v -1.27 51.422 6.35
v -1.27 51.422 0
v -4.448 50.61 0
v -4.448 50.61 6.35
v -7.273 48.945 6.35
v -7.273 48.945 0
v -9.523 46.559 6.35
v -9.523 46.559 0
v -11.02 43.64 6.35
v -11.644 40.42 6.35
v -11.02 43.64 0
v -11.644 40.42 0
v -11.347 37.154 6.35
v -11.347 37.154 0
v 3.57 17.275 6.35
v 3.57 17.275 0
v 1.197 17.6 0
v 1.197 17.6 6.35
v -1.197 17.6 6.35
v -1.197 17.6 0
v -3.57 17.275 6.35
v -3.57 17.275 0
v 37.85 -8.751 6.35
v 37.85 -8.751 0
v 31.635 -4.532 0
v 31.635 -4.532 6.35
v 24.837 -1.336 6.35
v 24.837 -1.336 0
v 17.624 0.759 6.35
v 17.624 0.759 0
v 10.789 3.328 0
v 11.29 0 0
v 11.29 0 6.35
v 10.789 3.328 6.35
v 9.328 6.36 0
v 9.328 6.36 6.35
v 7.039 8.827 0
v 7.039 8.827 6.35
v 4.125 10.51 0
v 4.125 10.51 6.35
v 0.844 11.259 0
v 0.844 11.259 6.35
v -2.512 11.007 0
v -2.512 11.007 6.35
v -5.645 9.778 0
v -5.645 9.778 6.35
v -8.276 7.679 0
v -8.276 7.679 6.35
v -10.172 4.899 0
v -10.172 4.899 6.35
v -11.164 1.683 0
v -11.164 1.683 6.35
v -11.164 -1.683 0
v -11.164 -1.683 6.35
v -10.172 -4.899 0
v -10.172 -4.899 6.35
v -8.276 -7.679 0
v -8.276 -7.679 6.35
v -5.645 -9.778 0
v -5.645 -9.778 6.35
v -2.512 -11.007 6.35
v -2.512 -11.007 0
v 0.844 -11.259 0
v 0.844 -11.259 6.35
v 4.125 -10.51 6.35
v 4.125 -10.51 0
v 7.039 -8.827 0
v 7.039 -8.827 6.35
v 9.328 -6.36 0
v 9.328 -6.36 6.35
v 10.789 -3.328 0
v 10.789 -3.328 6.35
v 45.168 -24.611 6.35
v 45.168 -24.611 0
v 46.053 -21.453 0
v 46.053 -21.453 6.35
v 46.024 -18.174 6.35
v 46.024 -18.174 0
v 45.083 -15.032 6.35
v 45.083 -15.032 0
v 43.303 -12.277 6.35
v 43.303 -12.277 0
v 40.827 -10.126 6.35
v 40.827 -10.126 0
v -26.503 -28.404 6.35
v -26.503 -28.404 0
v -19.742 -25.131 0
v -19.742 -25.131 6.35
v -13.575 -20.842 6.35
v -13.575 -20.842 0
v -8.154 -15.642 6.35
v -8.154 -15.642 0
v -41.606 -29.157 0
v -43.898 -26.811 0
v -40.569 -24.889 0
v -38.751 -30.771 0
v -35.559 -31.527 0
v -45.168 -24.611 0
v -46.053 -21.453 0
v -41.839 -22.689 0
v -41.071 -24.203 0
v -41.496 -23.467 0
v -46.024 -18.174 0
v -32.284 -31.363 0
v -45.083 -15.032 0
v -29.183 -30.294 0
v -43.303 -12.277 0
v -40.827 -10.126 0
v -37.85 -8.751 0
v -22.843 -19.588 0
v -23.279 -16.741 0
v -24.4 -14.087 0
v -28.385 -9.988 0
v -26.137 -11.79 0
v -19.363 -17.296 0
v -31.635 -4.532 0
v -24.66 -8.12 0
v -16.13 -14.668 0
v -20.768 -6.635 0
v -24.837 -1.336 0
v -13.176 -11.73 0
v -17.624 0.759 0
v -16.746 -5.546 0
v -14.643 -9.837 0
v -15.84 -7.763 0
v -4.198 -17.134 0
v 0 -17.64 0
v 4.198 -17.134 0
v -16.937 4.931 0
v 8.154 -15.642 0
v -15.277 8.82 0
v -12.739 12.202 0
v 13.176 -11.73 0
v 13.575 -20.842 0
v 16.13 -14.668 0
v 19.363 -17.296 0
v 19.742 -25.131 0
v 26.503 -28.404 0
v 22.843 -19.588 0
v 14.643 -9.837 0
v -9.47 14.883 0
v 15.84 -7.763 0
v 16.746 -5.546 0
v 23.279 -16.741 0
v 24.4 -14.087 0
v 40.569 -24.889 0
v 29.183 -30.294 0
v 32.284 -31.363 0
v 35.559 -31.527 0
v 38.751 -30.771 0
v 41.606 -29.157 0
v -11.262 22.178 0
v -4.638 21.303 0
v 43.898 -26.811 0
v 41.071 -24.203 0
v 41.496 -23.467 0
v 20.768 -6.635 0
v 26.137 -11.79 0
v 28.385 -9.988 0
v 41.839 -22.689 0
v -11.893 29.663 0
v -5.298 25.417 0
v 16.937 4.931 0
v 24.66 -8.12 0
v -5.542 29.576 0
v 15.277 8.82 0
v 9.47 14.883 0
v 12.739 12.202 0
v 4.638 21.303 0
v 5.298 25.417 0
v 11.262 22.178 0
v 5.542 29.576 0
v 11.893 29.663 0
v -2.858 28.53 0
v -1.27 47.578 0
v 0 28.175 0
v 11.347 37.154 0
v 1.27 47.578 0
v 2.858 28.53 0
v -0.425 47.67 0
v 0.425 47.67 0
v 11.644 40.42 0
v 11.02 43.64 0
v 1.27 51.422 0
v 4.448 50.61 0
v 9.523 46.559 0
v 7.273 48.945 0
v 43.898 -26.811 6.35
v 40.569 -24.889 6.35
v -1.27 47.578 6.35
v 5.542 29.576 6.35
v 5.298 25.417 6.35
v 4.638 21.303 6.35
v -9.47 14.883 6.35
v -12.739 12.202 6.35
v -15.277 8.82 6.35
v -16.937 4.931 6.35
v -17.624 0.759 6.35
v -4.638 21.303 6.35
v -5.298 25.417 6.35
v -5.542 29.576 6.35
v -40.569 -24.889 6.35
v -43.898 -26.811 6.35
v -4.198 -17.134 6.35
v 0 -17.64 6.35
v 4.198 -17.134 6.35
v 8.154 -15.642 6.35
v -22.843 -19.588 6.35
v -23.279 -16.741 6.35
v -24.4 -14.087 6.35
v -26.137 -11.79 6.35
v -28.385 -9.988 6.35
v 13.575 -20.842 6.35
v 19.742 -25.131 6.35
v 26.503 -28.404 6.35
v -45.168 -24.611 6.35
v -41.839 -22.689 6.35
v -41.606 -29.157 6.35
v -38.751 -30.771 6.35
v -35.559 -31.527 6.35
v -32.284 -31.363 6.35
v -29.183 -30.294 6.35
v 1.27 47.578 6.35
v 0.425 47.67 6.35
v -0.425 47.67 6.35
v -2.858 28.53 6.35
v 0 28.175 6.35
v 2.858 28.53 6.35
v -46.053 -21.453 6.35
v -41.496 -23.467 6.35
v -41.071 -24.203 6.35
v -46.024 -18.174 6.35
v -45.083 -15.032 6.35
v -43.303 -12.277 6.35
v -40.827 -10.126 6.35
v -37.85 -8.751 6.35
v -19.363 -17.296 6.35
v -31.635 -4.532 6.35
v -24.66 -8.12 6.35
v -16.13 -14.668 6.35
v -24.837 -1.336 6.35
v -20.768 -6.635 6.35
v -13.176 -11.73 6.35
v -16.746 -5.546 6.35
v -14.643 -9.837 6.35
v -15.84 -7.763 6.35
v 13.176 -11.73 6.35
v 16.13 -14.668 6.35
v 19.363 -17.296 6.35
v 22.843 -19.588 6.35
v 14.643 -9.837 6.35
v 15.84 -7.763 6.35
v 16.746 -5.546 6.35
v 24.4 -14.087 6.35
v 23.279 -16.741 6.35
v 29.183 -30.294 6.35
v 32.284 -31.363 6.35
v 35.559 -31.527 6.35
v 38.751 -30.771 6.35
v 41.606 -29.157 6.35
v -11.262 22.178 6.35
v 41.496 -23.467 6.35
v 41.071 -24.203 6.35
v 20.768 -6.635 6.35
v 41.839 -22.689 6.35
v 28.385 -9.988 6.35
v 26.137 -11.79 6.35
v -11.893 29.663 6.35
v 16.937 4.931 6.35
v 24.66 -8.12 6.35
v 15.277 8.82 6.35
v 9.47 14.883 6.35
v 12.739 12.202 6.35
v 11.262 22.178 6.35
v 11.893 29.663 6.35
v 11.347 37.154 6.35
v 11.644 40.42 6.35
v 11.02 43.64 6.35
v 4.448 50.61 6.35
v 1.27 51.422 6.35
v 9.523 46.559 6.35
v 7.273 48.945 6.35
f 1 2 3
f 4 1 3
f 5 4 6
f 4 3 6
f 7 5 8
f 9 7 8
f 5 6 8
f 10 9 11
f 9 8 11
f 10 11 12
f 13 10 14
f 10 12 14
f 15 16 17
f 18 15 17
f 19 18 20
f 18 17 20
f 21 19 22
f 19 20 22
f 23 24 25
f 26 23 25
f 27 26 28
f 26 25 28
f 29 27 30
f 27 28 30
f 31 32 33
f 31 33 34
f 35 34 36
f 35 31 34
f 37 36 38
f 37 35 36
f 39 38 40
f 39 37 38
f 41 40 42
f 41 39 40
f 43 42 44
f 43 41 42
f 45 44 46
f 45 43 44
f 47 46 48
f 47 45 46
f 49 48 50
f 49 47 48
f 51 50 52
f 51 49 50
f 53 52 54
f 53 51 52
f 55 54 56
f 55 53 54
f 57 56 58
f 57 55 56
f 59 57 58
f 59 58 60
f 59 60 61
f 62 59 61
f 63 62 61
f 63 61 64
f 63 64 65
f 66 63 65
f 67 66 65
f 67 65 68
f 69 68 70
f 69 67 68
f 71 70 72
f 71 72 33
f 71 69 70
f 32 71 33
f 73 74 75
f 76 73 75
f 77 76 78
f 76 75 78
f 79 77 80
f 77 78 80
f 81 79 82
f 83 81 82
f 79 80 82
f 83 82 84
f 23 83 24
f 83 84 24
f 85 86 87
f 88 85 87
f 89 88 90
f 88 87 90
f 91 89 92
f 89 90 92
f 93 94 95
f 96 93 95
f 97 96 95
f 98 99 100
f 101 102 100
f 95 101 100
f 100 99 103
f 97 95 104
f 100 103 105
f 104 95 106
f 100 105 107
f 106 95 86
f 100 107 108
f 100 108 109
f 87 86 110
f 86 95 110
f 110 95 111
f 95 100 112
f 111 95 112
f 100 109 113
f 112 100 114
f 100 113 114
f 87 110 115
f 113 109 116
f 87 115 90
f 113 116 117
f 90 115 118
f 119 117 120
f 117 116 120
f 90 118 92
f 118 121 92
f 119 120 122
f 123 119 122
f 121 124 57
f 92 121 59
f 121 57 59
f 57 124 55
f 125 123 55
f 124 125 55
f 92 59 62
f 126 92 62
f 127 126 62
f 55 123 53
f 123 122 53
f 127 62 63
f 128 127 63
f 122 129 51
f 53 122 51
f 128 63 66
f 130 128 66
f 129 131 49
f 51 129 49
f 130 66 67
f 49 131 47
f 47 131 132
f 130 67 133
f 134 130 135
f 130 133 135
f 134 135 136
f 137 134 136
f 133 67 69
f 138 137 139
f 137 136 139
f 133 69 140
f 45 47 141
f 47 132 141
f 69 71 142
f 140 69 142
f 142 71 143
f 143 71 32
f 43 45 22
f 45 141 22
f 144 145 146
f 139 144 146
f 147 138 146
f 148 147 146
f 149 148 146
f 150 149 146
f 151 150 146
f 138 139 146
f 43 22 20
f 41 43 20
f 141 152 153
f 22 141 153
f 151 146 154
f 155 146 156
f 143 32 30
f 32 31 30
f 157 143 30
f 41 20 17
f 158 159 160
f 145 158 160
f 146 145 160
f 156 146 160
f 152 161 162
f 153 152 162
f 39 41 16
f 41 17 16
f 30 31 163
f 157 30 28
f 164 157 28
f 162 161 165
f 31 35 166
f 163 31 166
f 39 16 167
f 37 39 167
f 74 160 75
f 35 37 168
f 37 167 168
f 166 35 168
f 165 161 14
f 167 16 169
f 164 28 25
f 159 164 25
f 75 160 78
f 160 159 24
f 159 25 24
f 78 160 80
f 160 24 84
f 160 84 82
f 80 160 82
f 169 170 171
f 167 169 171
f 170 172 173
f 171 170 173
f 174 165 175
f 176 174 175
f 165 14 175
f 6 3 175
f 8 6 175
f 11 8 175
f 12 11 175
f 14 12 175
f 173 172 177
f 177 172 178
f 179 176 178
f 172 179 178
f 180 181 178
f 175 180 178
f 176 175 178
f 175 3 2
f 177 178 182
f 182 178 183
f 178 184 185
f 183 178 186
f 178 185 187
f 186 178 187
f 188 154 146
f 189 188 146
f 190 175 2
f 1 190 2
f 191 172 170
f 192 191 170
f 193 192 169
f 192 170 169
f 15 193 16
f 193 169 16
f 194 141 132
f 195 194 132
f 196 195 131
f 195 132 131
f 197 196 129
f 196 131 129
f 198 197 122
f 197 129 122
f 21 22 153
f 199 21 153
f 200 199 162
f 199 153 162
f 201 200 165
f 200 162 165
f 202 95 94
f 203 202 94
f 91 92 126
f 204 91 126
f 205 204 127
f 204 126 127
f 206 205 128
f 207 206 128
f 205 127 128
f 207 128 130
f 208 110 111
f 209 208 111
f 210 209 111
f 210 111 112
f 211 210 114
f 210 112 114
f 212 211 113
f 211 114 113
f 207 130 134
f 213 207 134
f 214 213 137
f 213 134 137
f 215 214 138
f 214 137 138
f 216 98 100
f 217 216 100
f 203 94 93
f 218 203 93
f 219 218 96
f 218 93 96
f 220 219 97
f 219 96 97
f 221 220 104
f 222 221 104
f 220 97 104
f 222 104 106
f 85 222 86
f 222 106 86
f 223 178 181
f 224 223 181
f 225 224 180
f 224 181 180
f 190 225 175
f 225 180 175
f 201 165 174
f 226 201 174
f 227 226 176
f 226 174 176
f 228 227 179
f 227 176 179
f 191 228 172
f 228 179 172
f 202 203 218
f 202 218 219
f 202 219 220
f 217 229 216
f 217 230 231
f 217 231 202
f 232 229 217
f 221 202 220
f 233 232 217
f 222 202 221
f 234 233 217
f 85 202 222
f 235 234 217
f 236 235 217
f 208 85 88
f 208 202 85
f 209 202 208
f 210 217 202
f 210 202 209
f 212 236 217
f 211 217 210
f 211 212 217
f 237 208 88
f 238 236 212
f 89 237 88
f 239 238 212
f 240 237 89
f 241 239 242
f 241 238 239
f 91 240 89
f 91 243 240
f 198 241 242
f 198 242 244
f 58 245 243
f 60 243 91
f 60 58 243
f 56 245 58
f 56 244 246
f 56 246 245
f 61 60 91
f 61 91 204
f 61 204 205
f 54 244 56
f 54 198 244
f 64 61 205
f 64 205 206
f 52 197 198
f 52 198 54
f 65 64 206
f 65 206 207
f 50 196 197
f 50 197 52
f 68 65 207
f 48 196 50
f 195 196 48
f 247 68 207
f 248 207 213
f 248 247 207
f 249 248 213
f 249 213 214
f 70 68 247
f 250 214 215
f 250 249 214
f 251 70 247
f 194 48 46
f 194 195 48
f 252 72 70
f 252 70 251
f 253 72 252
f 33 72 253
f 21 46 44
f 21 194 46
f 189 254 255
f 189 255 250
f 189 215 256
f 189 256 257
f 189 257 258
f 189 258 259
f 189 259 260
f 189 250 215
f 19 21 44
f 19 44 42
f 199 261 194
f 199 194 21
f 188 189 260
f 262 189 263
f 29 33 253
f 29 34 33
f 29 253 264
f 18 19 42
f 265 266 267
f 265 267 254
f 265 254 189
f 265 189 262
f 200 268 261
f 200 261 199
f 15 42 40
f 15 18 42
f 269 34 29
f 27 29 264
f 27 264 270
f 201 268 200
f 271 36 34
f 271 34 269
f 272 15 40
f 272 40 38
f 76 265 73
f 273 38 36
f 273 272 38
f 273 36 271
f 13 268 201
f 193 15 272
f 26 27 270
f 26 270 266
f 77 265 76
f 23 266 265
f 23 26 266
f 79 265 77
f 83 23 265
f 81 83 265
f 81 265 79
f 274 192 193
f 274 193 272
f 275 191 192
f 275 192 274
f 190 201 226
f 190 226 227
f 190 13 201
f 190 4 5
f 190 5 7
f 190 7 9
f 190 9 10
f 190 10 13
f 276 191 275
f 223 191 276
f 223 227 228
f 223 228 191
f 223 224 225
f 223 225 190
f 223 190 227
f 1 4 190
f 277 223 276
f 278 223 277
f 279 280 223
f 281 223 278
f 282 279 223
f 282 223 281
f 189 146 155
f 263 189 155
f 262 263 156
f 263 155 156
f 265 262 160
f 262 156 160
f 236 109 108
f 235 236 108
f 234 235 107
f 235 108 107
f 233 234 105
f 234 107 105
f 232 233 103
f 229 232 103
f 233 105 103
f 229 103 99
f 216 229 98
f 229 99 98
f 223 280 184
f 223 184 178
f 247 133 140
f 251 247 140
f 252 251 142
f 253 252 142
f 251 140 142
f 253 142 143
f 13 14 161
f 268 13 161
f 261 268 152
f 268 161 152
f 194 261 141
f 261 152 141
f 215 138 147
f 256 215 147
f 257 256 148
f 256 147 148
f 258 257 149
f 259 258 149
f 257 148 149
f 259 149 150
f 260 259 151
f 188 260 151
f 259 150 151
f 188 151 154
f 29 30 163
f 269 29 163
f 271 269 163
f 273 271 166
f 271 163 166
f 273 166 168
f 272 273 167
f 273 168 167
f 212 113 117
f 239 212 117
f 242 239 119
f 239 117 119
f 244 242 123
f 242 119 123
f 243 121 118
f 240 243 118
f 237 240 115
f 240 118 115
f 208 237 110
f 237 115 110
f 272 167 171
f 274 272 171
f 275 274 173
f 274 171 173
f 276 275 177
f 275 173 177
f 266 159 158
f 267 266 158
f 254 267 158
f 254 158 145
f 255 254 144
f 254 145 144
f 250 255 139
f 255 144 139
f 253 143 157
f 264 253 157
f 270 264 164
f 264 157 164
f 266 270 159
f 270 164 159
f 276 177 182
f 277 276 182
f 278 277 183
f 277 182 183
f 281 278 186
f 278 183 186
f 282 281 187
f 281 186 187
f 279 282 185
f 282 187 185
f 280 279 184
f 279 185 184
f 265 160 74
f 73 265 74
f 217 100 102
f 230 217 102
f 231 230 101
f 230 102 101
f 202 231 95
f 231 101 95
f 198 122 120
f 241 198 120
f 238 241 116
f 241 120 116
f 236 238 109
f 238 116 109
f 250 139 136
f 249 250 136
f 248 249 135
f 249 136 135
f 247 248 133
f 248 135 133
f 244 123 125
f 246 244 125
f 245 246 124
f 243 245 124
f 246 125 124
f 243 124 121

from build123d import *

# Parameters (mm, degrees)
F0_R     = 11.2903
F1_DEPTH = 6.35


with BuildPart() as f1:
    # F0 (on Top) → F1 (new body)
    with BuildSketch(Plane.XY):
        with BuildLine():
            ThreePointArc((-11.346624, 37.154203), (-11.72432, 25.907716), (-9.469638, 14.883083))
            ThreePointArc((-9.469638, 14.883083), (-15.276948, 8.82015), (-17.623946, 0.759406))
            ThreePointArc((-17.623946, 0.759406), (-28.2989, -2.800299), (-37.849796, -8.750637))
            ThreePointArc((-37.849796, -8.750637), (-45.082615, -15.032073), (-45.168132, -24.611364))
            Line((-45.168132, -24.611364), (-41.839084, -22.689337))
            ThreePointArc((-41.839084, -22.689337), (-35.905842, -12.195564), (-26.647972, -19.916605))
            ThreePointArc((-26.647972, -19.916605), (-31.856515, -27.307858), (-40.569084, -24.889041))
            Line((-40.569084, -24.889041), (-43.898132, -26.811068))
            ThreePointArc((-43.898132, -26.811068), (-35.559465, -31.526653), (-26.503172, -28.403566))
            ThreePointArc((-26.503172, -28.403566), (-16.57458, -23.107417), (-8.154309, -15.642488))
            ThreePointArc((-8.154309, -15.642488), (0, -17.6403), (8.154309, -15.642488))
            ThreePointArc((8.154309, -15.642488), (16.57458, -23.107417), (26.503172, -28.403566))
            ThreePointArc((26.503172, -28.403566), (35.559465, -31.526653), (43.898132, -26.811068))
            Line((43.898132, -26.811068), (40.569084, -24.889041))
            ThreePointArc((40.569084, -24.889041), (27.105319, -17.276548), (42.345172, -19.916605))
            ThreePointArc((42.345172, -19.916605), (42.217614, -21.325875), (41.839084, -22.689337))
            Line((41.839084, -22.689337), (45.168132, -24.611364))
            ThreePointArc((45.168132, -24.611364), (45.082615, -15.032073), (37.849796, -8.750637))
            ThreePointArc((37.849796, -8.750637), (28.2989, -2.800299), (17.623946, 0.759406))
            ThreePointArc((17.623946, 0.759406), (15.276948, 8.82015), (9.469638, 14.883083))
            ThreePointArc((9.469638, 14.883083), (11.72432, 25.907716), (11.346624, 37.154203))
            ThreePointArc((11.346624, 37.154203), (9.52315, 46.558727), (1.27, 51.422432))
            Line((1.27, 51.422432), (1.27, 47.578378))
            ThreePointArc((1.27, 47.578378), (5.981983, 44.914195), (7.8486, 39.83321))
            ThreePointArc((7.8486, 39.83321), (-5.080984, 33.851227), (-1.27, 47.578378))
            Line((-1.27, 47.578378), (-1.27, 51.422432))
            ThreePointArc((-1.27, 51.422432), (-9.52315, 46.558727), (-11.346624, 37.154203))
        make_face()
        with BuildLine():
            ThreePointArc((-13.175642, -11.729563), (-17.713182, -16.022689), (-22.842613, -19.587676))
            ThreePointArc((-22.842613, -19.587676), (-24.399928, -14.087305), (-28.384732, -9.988445))
            ThreePointArc((-28.384732, -9.988445), (-22.732647, -7.328721), (-16.745921, -5.545659))
            ThreePointArc((-16.745921, -5.545659), (-15.276948, -8.82015), (-13.175642, -11.729563))
        make_face(mode=Mode.SUBTRACT)
        with BuildLine():
            ThreePointArc((16.745921, -5.545659), (22.732647, -7.328721), (28.384732, -9.988445))
            ThreePointArc((28.384732, -9.988445), (24.399928, -14.087305), (22.842613, -19.587676))
            ThreePointArc((22.842613, -19.587676), (17.713182, -16.022689), (13.175642, -11.729563))
            ThreePointArc((13.175642, -11.729563), (15.276948, -8.82015), (16.745921, -5.545659))
        make_face(mode=Mode.SUBTRACT)
        Circle(F0_R, mode=Mode.SUBTRACT)
        with BuildLine():
            ThreePointArc((-3.570279, 17.275222), (-5.019465, 23.35141), (-5.542119, 29.576122))
            ThreePointArc((-5.542119, 29.576122), (0, 28.17461), (5.542119, 29.576122))
            ThreePointArc((5.542119, 29.576122), (5.019465, 23.35141), (3.570279, 17.275222))
            ThreePointArc((3.570279, 17.275222), (0, 17.6403), (-3.570279, 17.275222))
        make_face(mode=Mode.SUBTRACT)
        with BuildLine():
            ThreePointArc((-26.647972, -19.916605), (-35.905842, -12.195564), (-41.839084, -22.689337))
            ThreePointArc((-41.839084, -22.689337), (-41.293659, -23.840905), (-40.569084, -24.889041))
            ThreePointArc((-40.569084, -24.889041), (-31.856515, -27.307858), (-26.647972, -19.916605))
        make_face()
        with BuildLine():
            ThreePointArc((1.27, 47.578378), (0, 47.68181), (-1.27, 47.578378))
            ThreePointArc((-1.27, 47.578378), (-5.080984, 33.851227), (7.8486, 39.83321))
            ThreePointArc((7.8486, 39.83321), (5.981983, 44.914195), (1.27, 47.578378))
        make_face()
        with BuildLine():
            ThreePointArc((40.569084, -24.889041), (41.293659, -23.840905), (41.839084, -22.689337))
            ThreePointArc((41.839084, -22.689337), (42.217614, -21.325875), (42.345172, -19.916605))
            ThreePointArc((42.345172, -19.916605), (27.105319, -17.276548), (40.569084, -24.889041))
        make_face()
    extrude(amount=F1_DEPTH)


solid = f1.part
